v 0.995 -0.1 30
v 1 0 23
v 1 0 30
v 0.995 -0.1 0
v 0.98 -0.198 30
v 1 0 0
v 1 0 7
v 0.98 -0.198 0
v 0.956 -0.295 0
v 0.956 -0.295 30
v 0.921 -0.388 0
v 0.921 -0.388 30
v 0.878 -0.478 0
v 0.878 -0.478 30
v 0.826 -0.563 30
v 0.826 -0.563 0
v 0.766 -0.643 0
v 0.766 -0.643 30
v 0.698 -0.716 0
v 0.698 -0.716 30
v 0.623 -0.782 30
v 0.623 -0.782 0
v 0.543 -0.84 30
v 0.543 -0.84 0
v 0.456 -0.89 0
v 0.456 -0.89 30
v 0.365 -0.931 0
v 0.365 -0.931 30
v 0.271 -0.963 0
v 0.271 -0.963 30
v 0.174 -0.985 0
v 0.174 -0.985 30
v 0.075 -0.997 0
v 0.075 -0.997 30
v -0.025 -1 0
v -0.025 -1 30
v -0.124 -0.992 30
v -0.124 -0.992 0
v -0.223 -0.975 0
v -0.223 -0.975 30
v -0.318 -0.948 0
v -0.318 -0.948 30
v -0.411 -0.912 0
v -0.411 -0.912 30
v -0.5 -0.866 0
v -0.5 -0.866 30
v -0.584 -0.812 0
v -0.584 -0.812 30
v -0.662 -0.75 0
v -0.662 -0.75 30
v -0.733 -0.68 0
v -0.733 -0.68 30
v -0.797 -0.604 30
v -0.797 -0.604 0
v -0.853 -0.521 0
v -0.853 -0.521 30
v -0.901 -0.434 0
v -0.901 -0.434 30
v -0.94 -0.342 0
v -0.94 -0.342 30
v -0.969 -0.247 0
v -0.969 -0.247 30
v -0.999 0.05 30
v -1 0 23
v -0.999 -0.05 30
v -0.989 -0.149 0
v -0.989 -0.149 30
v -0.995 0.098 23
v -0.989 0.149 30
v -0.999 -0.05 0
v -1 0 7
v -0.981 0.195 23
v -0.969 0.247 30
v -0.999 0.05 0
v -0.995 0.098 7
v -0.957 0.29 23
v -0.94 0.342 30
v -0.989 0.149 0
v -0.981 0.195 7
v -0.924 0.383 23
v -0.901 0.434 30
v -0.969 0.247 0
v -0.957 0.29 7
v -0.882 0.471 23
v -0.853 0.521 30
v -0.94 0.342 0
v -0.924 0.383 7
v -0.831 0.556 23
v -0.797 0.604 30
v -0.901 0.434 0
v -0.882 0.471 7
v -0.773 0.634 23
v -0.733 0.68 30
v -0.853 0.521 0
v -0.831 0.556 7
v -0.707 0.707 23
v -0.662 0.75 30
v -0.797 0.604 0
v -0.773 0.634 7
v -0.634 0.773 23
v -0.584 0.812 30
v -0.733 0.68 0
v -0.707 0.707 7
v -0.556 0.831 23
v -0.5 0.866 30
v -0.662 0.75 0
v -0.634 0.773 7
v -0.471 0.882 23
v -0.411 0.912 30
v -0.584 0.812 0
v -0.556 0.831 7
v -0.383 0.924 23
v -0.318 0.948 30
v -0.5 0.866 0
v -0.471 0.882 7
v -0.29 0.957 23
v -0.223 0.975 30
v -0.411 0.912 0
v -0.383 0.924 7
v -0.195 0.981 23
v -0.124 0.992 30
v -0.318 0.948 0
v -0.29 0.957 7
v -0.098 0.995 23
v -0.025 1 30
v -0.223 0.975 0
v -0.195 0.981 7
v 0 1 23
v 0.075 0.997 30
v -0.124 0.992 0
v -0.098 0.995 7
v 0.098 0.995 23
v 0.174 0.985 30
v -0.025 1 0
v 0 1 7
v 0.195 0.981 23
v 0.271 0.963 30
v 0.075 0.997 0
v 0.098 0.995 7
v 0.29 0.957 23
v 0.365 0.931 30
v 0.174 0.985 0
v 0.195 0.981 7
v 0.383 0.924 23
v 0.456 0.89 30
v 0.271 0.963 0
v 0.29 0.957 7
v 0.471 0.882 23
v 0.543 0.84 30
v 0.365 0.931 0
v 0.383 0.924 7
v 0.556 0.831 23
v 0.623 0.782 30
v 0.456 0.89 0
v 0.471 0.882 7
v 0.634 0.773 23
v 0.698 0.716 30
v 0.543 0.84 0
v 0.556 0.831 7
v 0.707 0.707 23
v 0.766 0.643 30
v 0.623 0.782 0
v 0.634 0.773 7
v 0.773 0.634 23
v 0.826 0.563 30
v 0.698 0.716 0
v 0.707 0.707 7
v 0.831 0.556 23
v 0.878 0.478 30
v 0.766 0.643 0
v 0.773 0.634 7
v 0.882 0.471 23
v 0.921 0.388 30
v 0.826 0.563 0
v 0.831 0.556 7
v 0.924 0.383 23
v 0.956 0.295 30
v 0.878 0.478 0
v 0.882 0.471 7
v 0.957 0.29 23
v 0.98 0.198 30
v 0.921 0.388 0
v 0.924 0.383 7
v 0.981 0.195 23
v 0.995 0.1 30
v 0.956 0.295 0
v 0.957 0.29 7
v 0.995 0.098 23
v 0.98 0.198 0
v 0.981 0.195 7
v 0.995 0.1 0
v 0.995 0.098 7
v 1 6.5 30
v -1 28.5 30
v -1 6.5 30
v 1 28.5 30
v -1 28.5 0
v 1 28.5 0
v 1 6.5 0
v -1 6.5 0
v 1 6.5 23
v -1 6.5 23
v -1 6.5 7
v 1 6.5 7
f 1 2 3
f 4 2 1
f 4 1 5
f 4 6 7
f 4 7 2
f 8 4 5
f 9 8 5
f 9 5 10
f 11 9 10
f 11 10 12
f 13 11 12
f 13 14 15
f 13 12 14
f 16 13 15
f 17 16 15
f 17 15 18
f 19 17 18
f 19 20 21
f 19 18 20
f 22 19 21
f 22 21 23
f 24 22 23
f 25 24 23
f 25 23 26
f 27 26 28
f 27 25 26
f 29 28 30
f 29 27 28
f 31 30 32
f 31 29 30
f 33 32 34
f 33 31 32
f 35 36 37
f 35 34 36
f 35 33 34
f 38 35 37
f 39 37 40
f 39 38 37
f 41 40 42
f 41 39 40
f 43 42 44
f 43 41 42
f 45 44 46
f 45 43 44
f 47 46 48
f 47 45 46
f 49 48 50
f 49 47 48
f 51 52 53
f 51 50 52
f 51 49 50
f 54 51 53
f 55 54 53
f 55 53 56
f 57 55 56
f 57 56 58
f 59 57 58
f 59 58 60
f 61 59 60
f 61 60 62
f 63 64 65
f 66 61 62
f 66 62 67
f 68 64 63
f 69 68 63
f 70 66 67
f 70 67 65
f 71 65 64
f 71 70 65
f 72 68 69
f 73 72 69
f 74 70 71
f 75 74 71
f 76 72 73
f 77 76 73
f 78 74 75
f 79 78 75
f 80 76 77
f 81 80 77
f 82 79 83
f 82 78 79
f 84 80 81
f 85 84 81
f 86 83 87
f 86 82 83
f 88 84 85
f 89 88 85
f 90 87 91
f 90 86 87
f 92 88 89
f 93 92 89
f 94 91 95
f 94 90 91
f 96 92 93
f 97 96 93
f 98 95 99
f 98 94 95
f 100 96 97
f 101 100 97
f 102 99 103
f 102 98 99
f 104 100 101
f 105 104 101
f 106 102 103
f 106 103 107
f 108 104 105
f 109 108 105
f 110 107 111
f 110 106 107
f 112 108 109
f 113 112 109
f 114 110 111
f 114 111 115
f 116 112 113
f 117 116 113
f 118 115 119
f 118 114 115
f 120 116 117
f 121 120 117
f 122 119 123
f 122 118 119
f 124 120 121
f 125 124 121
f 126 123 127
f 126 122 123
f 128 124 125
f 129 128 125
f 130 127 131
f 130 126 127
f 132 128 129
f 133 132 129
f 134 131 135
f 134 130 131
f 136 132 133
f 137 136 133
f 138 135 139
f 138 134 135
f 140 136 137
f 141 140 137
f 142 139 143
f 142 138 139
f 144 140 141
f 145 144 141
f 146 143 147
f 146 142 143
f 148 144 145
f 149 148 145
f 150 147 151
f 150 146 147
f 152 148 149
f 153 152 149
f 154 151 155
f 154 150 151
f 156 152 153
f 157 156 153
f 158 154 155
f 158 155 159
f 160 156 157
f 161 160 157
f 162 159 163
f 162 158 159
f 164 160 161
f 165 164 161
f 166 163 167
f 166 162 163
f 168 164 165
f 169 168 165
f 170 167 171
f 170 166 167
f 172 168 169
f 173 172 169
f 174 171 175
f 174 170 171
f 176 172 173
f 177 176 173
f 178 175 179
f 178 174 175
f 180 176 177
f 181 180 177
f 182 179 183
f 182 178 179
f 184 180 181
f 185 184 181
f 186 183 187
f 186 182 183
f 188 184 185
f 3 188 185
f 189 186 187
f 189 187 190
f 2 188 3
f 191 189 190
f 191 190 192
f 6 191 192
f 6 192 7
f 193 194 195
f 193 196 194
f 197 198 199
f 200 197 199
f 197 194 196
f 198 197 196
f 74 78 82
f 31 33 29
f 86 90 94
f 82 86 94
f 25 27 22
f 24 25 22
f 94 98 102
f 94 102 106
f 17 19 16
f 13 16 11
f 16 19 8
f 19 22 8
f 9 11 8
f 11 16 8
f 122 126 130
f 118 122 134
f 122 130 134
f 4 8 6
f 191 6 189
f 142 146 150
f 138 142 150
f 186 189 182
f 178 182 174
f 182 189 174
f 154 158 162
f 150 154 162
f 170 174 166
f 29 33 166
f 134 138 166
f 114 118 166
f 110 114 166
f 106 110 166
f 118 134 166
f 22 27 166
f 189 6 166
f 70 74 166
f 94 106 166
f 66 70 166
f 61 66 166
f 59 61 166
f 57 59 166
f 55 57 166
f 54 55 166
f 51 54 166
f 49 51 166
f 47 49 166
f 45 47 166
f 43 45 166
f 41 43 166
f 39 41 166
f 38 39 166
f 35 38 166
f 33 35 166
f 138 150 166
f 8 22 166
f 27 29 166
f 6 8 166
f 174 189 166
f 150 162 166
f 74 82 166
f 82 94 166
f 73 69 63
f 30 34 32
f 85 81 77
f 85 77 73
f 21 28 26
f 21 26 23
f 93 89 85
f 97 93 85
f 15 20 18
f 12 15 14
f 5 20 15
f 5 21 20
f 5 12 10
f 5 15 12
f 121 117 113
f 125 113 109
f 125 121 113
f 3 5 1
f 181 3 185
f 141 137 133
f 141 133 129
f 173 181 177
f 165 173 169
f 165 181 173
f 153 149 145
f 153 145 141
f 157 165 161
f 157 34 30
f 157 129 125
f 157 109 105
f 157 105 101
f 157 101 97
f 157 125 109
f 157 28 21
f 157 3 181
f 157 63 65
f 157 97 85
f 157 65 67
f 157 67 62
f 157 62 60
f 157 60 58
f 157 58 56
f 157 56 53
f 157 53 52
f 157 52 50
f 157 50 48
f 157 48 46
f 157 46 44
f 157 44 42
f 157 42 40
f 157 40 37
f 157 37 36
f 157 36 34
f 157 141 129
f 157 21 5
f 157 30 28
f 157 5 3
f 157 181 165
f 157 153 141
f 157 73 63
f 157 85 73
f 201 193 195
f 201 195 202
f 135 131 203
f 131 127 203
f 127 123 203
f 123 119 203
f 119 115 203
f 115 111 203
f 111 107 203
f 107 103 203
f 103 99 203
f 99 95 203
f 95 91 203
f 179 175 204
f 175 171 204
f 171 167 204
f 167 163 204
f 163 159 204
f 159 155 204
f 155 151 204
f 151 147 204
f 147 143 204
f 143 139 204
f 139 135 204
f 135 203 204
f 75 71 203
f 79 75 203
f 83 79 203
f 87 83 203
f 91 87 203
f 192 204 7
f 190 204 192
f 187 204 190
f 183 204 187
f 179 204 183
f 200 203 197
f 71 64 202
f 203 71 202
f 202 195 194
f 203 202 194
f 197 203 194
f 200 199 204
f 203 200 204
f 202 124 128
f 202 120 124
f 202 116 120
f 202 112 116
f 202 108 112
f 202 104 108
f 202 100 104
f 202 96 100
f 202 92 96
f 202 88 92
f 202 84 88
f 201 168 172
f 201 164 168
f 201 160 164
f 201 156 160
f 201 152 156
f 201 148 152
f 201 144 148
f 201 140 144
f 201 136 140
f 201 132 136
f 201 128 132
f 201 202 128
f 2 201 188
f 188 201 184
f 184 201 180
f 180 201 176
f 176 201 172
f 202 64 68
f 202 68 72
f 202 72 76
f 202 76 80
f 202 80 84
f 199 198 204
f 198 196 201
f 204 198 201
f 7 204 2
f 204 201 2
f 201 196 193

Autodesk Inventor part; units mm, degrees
ref_plane "YZ Plane" through (0, 0, 0) normal (1, 0, 0) x (0, 1, 0)
ref_plane "XZ Plane" through (0, 0, 0) normal (0, 1, 0) x (-1, 0, 0)
ref_plane "XY Plane" through (0, 0, 0) normal (0, 0, 1) x (1, 0, 0)
sketch "Sketch1" plane through (0, 0, 0) normal (0, 0, 1) x (1, 0, 0)
  circle A0 centre (0, 0) radius 1
  dimension "d0" = 2
extrude "Extrusion1" add sketch "Sketch1" along normal blind 30
ref_plane "Work Plane1" through (0, 0, 23) normal (0, 0, 1) x (1, 0, 0)
ref_plane "Work Plane2" through (0, 0, 7) normal (0, 0, -1) x (-1, 0, 0)
sketch "Sketch2" plane through (0, 0, 23) normal (0, 0, 1) x (1, 0, 0)
  circle A0 centre (0, 0) radius 1 projected
  line L0 (1, 0) -> (-1, 0)
  line L1 (-1, 0) -> (-1, 28.5)
  line L2 (-1, 28.5) -> (1, 28.5)
  line L3 (1, 28.5) -> (1, 0)
  dimension "d7" = 28.5
extrude "Extrusion2" add sketch "Sketch2" against normal up to surface (16 mm away) contours A0 L1 L2 L3
sketch "Sketch3" plane through (1, 0, 23) normal (1, 0, 0) x (0, 0, -1)
  line L0 (16, 0) -> (16, 28.5) projected
  line L1 (0, 28.5) -> (16, 28.5) projected
  line L2 (0, 0) -> (0, 28.5) projected
  line L3 (16, 0) -> (0, 0) projected
  line L4 (0, 28.5) -> (-7, 28.5)
  line L5 (-7, 28.5) -> (-7, 6.5)
  line L6 (-7, 6.5) -> (0, 6.5)
  line L7 (0, 6.5) -> (0, 28.5)
  line L8 (16, 0) -> (16, 28.5) projected
  line L9 (16, 28.5) -> (23, 28.5)
  line L10 (23, 28.5) -> (23, 6.5)
  line L11 (23, 6.5) -> (16, 6.5)
  line L12 (16, 6.5) -> (16, 28.5)
  line L13 (23, -1) -> (23, 1) projected
  line L14 (-7, 1) -> (-7, -1) projected
  line L15 (16, 0) -> (0, 0) projected
  line L16 (16, 0) -> (16, 0) projected
  line L17 (16, 0) -> (0, 0) projected
  line L18 (0, 0) -> (0, 0) projected
  point P0 (23, 0)
  point P1 (19.5, 6.5)
  point P2 (-3.5, 6.5)
  point P3 (23, 0)
  point P4 (23, 17.5)
  point P5 (-7, 17.5)
  point P6 (-7, 0)
  dimension "d10" = 5.5
extrude "Extrusion3" add sketch "Sketch3" against normal up to surface (2 mm away) contours L0 L9 L10 L11 | L6 L5 L4 L2
properties part number "gpsDoor"
